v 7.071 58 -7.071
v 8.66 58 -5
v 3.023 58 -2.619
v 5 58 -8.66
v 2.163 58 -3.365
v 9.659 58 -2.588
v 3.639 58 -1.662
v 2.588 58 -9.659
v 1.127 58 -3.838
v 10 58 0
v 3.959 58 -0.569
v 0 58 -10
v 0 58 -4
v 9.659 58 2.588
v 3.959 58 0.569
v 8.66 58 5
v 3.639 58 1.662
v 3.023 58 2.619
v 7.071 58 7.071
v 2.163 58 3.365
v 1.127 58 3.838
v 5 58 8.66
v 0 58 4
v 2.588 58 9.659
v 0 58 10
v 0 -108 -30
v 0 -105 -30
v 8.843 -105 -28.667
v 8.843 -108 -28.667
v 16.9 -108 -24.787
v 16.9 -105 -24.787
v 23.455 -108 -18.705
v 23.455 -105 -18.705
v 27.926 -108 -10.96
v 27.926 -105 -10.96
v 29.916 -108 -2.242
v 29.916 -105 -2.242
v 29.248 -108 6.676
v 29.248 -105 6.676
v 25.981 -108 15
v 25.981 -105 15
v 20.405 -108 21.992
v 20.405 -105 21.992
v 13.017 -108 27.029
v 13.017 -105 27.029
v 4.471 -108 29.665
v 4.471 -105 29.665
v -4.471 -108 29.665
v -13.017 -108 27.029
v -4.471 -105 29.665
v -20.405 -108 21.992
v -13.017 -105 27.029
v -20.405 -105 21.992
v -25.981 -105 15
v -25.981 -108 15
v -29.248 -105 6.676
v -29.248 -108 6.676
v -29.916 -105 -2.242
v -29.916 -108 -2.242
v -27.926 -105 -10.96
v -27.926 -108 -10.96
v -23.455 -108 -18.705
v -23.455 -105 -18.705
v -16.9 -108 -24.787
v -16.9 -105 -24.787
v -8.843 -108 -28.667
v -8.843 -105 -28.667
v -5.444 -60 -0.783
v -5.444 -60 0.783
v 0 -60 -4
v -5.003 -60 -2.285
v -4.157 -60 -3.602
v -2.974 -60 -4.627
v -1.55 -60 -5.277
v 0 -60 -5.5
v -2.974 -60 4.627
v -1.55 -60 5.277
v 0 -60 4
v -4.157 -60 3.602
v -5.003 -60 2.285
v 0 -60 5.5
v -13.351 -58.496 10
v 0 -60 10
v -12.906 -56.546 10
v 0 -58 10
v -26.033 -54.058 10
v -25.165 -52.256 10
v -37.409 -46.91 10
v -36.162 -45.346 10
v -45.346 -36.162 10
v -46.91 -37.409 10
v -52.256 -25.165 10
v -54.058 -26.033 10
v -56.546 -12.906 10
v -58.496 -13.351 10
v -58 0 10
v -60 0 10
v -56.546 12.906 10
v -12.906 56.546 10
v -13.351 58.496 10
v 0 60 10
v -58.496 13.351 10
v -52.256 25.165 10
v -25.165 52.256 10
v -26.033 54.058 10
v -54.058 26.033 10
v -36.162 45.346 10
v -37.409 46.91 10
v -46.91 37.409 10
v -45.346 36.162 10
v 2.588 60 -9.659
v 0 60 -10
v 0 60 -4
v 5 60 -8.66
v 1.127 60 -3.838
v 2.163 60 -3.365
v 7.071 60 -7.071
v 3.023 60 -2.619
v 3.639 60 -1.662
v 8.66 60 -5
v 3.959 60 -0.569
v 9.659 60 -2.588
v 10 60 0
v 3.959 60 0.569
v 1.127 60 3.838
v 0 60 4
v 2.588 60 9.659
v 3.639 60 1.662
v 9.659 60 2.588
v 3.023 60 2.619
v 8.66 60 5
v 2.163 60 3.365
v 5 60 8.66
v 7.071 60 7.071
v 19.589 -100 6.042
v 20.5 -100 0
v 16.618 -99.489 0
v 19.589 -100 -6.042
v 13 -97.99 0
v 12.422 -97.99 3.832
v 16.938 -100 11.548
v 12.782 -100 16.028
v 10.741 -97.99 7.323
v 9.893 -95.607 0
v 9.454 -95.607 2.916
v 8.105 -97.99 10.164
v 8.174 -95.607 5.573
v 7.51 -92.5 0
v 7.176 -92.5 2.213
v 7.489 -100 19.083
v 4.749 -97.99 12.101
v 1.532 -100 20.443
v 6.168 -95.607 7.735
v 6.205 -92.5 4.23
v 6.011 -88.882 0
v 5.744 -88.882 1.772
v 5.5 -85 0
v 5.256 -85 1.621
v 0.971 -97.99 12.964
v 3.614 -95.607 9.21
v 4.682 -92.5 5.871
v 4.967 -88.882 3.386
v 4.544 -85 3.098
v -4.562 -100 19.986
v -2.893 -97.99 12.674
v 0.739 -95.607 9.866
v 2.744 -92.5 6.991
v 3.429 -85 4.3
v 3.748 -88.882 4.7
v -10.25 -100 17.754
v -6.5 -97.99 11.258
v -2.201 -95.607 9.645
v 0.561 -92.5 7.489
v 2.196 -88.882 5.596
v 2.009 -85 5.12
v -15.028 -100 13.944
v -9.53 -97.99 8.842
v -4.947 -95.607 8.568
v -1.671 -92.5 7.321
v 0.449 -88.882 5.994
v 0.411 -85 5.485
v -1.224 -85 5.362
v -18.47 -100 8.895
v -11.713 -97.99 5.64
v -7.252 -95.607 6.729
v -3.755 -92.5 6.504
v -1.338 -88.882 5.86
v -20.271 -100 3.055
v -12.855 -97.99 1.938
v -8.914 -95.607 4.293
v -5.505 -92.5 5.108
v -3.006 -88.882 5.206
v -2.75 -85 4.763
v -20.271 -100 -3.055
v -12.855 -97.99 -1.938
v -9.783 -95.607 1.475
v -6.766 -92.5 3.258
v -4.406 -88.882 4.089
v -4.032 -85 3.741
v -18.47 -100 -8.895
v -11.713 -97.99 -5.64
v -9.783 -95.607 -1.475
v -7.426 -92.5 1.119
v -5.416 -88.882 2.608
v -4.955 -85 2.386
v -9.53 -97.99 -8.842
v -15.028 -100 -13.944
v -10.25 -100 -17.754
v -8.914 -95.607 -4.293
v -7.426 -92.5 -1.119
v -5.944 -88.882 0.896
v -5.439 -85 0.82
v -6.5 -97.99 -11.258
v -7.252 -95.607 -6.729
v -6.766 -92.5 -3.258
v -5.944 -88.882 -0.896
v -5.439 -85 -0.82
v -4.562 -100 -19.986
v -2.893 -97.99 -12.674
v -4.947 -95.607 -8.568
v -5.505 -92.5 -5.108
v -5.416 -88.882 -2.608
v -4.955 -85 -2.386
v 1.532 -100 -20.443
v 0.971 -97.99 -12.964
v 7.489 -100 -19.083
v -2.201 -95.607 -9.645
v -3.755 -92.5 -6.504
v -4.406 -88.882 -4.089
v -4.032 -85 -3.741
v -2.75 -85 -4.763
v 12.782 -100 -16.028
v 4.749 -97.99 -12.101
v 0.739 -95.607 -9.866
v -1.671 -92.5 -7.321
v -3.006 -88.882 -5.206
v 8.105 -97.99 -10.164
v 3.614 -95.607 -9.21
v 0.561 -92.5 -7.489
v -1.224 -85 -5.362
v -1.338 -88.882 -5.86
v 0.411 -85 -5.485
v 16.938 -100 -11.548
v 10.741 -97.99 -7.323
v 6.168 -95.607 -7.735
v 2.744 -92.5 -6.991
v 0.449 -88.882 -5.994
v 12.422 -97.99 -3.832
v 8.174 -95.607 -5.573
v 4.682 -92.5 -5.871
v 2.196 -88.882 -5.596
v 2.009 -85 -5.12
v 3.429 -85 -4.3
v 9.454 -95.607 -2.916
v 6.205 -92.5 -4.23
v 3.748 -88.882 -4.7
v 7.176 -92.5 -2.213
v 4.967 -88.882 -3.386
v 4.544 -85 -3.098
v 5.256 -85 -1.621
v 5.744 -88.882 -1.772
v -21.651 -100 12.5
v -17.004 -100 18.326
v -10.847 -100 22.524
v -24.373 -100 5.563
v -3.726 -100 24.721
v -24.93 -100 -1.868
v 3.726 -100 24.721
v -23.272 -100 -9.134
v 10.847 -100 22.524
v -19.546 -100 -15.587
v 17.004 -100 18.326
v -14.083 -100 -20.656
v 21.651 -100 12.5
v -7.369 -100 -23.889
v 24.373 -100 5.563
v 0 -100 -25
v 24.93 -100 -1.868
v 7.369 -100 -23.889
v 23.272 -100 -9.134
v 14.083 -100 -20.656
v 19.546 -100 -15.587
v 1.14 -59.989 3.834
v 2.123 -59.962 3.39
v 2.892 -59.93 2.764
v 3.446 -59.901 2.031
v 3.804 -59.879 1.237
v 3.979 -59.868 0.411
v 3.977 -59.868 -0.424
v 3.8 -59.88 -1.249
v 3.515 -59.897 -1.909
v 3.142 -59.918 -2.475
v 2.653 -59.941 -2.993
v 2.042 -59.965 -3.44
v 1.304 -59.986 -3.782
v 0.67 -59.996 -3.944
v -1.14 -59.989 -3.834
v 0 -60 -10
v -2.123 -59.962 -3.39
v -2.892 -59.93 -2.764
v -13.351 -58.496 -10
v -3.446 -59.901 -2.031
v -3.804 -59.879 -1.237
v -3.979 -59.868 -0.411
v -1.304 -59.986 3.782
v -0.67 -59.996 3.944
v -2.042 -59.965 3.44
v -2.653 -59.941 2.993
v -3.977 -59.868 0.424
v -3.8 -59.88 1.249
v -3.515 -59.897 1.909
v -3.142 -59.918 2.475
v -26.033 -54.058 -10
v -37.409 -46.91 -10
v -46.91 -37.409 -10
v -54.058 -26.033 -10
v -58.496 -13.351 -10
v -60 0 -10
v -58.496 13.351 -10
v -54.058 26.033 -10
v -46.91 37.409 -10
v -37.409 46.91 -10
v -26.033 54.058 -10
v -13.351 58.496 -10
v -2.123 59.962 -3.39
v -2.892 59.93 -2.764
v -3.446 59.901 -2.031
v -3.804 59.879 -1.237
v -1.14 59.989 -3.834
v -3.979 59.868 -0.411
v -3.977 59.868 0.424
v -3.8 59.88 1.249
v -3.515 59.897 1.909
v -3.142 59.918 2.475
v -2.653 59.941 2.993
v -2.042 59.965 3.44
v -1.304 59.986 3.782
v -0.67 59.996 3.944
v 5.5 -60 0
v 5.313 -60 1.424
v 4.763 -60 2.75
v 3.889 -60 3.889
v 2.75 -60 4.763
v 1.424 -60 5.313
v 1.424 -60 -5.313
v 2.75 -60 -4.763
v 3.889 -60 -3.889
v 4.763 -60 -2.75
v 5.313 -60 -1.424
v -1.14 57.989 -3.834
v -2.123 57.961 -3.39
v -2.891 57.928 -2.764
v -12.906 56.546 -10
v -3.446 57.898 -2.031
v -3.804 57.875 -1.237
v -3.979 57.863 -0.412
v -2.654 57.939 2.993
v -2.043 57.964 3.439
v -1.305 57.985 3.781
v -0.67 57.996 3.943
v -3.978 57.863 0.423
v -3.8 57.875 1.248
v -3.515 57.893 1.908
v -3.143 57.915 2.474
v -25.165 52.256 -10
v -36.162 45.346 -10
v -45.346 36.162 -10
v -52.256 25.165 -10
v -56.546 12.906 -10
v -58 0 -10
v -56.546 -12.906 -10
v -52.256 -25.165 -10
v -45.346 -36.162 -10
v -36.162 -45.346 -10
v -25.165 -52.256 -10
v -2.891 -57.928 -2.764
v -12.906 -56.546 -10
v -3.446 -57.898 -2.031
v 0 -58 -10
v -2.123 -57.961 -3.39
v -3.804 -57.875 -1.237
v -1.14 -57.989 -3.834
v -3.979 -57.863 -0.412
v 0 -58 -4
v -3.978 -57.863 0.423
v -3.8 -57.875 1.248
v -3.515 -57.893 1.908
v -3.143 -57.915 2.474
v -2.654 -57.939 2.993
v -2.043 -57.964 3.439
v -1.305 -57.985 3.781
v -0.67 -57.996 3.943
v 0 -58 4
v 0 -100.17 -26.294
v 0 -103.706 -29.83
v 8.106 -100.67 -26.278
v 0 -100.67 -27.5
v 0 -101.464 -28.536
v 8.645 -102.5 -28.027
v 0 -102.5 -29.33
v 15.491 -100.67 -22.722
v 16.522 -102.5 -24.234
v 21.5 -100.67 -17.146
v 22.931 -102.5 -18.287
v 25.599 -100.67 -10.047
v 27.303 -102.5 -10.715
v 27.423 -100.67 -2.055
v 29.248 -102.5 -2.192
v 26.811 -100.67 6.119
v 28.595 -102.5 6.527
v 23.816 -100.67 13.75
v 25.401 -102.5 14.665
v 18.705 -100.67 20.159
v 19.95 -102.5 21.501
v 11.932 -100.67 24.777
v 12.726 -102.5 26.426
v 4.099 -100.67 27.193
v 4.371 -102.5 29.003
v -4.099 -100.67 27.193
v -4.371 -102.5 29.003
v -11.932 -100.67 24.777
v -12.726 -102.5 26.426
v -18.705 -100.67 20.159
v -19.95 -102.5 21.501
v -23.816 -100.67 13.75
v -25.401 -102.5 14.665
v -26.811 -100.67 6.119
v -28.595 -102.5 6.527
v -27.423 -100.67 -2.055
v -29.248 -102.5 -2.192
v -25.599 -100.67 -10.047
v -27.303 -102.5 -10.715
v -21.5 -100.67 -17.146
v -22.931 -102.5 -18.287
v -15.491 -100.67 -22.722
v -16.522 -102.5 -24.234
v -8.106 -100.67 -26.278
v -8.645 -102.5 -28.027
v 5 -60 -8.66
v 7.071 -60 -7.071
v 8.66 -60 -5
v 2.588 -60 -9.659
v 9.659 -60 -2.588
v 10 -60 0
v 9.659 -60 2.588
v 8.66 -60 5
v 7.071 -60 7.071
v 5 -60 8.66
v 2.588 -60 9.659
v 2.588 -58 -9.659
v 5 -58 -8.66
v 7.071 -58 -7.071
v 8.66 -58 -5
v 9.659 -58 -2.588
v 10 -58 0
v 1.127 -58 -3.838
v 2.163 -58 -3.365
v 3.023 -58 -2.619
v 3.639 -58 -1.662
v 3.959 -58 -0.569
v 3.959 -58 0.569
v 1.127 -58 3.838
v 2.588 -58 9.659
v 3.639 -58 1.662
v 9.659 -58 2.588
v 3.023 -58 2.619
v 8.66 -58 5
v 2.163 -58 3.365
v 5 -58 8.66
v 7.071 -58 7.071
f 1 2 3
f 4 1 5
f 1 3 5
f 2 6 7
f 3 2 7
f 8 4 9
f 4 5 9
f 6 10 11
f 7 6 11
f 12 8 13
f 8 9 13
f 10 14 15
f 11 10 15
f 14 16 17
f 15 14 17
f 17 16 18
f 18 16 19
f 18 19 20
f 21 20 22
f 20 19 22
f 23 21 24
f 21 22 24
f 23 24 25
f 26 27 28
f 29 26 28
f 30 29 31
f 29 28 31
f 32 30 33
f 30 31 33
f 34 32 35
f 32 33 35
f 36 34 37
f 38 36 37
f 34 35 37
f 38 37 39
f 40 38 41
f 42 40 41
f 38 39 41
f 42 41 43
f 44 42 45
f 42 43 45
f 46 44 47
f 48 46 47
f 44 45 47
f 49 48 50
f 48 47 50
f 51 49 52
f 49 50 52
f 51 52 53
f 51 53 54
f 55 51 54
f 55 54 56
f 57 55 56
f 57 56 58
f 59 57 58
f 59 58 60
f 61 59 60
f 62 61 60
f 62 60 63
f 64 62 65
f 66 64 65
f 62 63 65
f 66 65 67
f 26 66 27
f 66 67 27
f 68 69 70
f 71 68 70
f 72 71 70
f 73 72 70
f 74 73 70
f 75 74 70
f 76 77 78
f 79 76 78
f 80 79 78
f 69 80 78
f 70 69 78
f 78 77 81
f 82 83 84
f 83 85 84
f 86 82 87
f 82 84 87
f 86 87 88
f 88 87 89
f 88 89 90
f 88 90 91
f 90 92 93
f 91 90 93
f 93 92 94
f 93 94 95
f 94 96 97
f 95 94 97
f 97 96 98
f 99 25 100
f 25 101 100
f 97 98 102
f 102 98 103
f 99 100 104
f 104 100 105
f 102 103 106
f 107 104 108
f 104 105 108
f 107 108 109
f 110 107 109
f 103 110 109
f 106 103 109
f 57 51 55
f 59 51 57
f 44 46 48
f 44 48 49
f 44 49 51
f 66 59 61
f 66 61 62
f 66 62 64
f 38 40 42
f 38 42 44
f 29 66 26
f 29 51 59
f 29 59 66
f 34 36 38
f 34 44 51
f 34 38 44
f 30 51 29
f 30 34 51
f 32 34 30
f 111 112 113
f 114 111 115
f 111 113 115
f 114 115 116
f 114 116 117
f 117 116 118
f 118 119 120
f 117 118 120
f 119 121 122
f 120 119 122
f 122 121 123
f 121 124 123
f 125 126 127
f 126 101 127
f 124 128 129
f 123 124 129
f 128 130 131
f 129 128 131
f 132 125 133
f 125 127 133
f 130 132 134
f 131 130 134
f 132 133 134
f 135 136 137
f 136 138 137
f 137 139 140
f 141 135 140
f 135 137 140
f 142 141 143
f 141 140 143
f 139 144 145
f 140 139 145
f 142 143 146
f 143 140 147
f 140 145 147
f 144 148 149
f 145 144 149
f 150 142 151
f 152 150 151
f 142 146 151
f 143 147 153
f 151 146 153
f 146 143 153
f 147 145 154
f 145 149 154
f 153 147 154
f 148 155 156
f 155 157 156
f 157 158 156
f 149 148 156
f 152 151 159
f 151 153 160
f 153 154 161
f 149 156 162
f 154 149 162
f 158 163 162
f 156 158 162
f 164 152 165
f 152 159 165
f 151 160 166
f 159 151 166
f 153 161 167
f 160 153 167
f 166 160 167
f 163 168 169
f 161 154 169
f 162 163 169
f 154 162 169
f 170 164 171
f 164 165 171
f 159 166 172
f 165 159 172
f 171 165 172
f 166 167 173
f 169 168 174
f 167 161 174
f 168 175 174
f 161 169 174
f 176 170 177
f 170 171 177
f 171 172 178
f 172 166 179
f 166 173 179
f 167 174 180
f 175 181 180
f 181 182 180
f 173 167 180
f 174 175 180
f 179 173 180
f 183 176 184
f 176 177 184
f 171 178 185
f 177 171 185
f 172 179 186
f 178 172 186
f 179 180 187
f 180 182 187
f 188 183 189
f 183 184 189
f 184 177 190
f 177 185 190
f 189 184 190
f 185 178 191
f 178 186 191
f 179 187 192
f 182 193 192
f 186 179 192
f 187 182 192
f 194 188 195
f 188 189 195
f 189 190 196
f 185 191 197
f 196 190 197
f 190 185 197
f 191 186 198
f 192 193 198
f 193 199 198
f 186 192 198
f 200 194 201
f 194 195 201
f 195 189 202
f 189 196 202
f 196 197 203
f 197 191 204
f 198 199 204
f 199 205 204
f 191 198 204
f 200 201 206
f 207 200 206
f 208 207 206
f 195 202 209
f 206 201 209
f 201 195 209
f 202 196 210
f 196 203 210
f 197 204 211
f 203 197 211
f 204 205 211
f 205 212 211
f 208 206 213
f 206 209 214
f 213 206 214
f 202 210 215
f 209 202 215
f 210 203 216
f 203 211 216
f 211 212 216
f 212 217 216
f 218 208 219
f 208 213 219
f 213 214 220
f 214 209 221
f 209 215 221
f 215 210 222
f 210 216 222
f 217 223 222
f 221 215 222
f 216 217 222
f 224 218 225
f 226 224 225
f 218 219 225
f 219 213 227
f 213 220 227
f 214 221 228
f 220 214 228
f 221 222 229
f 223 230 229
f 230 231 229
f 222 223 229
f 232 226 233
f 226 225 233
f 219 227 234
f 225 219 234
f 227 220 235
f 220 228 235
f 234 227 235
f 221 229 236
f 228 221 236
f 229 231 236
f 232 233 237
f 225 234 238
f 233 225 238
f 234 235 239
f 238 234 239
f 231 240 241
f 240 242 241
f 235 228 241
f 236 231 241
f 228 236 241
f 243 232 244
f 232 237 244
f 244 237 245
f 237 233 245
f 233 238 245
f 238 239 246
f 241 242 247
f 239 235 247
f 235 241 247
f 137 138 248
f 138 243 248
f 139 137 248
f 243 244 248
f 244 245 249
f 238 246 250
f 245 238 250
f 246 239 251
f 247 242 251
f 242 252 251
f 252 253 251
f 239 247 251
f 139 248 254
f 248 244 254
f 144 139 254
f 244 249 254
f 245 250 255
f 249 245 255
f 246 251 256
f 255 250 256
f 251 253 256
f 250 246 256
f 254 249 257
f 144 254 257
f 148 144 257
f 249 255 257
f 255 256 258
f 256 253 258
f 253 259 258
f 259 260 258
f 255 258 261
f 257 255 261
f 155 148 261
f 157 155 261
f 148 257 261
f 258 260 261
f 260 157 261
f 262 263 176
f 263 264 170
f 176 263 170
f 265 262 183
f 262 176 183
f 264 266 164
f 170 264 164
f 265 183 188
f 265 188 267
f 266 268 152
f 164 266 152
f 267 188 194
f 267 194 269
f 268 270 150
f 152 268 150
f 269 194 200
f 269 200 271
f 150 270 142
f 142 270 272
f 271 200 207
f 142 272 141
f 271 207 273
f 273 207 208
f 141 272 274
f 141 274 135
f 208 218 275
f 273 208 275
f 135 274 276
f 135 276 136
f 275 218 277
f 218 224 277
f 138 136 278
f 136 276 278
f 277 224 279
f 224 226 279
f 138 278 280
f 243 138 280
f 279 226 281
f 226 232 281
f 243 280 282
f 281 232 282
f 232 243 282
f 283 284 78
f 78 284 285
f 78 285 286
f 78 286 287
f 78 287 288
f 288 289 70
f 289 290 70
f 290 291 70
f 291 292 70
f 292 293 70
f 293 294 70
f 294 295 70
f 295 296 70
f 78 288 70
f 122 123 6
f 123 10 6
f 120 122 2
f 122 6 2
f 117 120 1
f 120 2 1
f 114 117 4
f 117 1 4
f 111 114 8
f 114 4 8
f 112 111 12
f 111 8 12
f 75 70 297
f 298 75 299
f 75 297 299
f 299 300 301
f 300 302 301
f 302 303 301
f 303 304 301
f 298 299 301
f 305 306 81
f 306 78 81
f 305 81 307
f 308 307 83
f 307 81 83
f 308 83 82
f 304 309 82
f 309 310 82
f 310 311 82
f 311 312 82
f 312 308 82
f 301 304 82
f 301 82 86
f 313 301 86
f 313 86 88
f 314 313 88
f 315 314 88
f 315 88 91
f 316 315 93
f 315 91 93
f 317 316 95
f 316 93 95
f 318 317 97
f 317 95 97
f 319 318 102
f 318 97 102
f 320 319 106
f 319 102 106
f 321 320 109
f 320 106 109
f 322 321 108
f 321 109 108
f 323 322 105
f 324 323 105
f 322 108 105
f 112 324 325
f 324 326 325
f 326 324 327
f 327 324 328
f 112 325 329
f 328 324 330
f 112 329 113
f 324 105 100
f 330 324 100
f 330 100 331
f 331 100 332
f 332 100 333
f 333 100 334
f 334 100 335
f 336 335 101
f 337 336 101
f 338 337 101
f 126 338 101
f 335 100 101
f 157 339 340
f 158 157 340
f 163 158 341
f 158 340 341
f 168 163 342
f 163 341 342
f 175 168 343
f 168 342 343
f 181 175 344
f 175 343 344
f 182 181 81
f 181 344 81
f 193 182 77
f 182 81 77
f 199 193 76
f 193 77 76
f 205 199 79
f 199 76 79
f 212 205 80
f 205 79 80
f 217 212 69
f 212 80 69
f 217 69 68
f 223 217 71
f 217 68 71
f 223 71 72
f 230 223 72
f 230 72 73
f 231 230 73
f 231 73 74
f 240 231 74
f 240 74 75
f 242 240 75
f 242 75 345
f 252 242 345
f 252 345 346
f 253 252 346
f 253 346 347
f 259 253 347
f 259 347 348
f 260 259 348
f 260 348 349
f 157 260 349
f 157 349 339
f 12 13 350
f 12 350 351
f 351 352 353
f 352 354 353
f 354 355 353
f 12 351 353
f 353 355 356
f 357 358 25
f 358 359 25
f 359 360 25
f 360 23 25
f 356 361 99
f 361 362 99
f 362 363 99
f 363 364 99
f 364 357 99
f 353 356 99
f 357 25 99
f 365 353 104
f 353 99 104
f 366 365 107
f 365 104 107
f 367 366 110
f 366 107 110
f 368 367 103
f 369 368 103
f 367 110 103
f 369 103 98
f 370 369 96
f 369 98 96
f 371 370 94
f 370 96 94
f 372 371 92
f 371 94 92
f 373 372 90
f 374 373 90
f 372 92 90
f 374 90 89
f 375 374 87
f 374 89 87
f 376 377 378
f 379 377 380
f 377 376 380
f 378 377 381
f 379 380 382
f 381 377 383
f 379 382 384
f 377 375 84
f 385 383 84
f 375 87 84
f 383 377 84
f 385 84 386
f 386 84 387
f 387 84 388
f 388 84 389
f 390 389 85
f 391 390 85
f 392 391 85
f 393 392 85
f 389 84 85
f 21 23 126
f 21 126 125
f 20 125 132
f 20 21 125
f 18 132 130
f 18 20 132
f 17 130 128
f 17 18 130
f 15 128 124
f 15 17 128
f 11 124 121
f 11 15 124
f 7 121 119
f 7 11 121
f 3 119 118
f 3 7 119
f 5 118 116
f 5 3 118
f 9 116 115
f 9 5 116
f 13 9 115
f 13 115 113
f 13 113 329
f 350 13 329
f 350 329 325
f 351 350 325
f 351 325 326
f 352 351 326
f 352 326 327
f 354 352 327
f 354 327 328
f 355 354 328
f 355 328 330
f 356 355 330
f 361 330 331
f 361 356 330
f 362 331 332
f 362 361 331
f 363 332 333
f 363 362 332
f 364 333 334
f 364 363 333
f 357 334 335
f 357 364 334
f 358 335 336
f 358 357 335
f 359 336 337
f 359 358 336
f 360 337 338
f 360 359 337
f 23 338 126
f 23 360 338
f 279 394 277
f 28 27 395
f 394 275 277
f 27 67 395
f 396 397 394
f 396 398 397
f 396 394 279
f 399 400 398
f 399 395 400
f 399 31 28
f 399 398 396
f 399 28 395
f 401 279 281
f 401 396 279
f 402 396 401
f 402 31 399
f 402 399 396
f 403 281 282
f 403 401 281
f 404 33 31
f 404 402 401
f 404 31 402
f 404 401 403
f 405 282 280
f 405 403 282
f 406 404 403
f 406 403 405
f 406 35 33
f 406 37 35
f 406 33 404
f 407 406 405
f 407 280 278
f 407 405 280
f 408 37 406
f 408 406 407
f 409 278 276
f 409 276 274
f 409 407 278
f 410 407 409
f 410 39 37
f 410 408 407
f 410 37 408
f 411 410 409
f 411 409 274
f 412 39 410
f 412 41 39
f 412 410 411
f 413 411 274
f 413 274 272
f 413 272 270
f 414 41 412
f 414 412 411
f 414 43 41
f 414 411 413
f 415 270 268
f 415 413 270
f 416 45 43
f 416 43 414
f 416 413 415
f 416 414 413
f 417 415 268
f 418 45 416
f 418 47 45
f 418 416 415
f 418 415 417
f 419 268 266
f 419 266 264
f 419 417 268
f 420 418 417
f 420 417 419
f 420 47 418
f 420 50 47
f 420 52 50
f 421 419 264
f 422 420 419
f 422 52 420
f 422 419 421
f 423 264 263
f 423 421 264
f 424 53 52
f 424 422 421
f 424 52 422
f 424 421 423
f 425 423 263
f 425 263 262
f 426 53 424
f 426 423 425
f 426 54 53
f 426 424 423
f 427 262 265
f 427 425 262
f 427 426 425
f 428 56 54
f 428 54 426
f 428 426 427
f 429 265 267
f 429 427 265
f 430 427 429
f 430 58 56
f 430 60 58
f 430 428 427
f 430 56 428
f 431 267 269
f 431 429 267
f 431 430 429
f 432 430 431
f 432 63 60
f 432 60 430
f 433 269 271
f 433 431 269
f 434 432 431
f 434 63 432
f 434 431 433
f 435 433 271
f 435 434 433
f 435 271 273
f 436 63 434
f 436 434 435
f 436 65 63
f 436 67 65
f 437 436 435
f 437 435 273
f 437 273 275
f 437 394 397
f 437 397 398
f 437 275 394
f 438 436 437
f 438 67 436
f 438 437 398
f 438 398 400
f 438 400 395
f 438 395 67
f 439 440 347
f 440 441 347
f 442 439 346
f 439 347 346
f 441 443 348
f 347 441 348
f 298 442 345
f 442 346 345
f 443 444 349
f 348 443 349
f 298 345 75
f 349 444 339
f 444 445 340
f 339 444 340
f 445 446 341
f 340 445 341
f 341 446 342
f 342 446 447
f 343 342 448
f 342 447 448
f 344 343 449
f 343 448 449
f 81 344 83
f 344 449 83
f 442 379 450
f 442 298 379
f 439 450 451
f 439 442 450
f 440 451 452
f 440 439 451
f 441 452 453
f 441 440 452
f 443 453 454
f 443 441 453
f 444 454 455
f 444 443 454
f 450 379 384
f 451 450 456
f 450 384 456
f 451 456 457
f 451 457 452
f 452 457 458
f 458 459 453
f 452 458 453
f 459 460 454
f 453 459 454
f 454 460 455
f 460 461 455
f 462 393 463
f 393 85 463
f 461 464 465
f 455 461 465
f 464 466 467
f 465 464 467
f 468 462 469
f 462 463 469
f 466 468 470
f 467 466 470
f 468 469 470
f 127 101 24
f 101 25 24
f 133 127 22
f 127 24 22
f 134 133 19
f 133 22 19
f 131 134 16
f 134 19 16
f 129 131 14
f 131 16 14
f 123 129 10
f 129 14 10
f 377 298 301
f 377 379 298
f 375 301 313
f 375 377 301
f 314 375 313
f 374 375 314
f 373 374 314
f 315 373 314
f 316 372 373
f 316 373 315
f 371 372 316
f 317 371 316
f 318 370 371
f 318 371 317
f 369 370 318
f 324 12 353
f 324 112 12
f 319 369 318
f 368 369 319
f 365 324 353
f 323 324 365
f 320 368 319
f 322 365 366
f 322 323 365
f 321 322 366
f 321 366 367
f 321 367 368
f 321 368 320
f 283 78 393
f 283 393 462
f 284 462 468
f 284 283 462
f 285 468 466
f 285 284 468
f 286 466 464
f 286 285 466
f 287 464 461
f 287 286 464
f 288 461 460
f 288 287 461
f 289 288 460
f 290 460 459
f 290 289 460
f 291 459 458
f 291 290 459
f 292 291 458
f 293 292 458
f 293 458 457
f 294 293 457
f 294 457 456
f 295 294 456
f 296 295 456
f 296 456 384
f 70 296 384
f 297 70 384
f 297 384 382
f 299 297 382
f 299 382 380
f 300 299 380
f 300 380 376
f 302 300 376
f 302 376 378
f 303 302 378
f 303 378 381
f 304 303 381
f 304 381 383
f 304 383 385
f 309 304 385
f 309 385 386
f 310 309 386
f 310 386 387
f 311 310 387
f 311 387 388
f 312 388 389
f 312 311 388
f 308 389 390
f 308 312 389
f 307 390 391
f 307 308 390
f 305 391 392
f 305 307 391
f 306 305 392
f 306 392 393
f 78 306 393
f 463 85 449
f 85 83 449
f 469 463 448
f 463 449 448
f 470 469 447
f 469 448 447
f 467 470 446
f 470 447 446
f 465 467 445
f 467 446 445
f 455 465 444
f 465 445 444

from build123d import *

# Parameters (mm, degrees)
BOSS_EXTRUDE1_DEPTH     = 10
CUT_EXTRUDE1_DEPTH      = 135.536240471
CUT_EXTRUDE1_DEPTH_BACK = 135.536240471
SKETCH3_R               = 4
FILLET1_R               = 10
BOSS_EXTRUDE2_OUTLINE_R = 5.5
BOSS_EXTRUDE2_DEPTH     = 40
BOSS_EXTRUDE2_START     = -5.5
BOSS_EXTRUDE2_2_DEPTH   = 11
SKETCH5_R               = 30
BOSS_EXTRUDE3_DEPTH     = 8
FILLET2_R               = 15
FILLET3_R               = 5


with BuildPart() as part:
    # Sketch2 → Boss-Extrude1 (new, symmetric)
    with BuildSketch(Plane.XY):
        with BuildLine():
            Line((0, 60), (10, 60))
            Line((10, 60), (10, 58))
            Line((10, 58), (0, 58))
            ThreePointArc((0, 58), (-58, 0), (0, -58))
            Line((0, -58), (10, -58))
            Line((10, -58), (10, -60))
            Line((10, -60), (0, -60))
            ThreePointArc((0, -60), (-60, 0), (0, 60))
        make_face()
    extrude(amount=BOSS_EXTRUDE1_DEPTH, both=True)

    # Sketch3 → Cut-Extrude1 (cut, two sides: drawn at the far end of the back side and taken through both)
    with BuildSketch(Plane(origin=(0, 60, 0), x_dir=(1, 0, 0), z_dir=(0, 1, 0)).offset(-CUT_EXTRUDE1_DEPTH_BACK)):
        with Locations(Location((0, 0, 0), (0, 0, 270))):
            Circle(SKETCH3_R)
    extrude(amount=CUT_EXTRUDE1_DEPTH + CUT_EXTRUDE1_DEPTH_BACK, mode=Mode.SUBTRACT)

    # Fillet1
    fillet1_edges = [part.edges().sort_by_distance(p)[0] for p in [
        (10, -59, -10),
        (10, -59, 10),
        (10, 59, -10),
        (10, 59, 10),
    ]]
    fillet(fillet1_edges, radius=FILLET1_R - 0.0001)  # a hair under: the kernel refuses the full size

    # Boss-Extrude2: read off the stored shape, not the designer's step
    # Boss-Extrude2 outline → Boss-Extrude2 (add)
    with BuildSketch(Plane.XZ.offset(60)):
        Circle(BOSS_EXTRUDE2_OUTLINE_R)
    extrude(amount=BOSS_EXTRUDE2_DEPTH)

    # Boss-Extrude2 2 outline → Boss-Extrude2 2 (add)
    with BuildSketch(Plane.XY.offset(BOSS_EXTRUDE2_START)):
        with BuildLine():
            Line((5, -59.799688591), (4.000851892, -59.866461263))
            ThreePointArc((4.000851892, -59.866461263), (2.001539936, -59.966606023), (0, -60))
            Line((0, -60), (5, -60))
            Line((5, -60), (5, -59.799688591))
        make_face()
    extrude(amount=BOSS_EXTRUDE2_2_DEPTH)

    # Sketch5 → Boss-Extrude3 (add)
    with BuildSketch(Plane.XZ.offset(100)):
        with Locations(Location((0, 0, 0), (0, 0, 270))):
            Circle(SKETCH5_R)
    extrude(amount=BOSS_EXTRUDE3_DEPTH)

    # Fillet2
    fillet2_edges = [part.edges().sort_by_distance(p)[0] for p in [
        (-5.5, -100, 0),
    ]]
    fillet(fillet2_edges, radius=FILLET2_R)

    # Fillet3
    fillet3_edges = [part.edges().sort_by_distance(p)[0] for p in [
        (0, -100, 30),
    ]]
    fillet(fillet3_edges, radius=FILLET3_R)


solid = part.part
